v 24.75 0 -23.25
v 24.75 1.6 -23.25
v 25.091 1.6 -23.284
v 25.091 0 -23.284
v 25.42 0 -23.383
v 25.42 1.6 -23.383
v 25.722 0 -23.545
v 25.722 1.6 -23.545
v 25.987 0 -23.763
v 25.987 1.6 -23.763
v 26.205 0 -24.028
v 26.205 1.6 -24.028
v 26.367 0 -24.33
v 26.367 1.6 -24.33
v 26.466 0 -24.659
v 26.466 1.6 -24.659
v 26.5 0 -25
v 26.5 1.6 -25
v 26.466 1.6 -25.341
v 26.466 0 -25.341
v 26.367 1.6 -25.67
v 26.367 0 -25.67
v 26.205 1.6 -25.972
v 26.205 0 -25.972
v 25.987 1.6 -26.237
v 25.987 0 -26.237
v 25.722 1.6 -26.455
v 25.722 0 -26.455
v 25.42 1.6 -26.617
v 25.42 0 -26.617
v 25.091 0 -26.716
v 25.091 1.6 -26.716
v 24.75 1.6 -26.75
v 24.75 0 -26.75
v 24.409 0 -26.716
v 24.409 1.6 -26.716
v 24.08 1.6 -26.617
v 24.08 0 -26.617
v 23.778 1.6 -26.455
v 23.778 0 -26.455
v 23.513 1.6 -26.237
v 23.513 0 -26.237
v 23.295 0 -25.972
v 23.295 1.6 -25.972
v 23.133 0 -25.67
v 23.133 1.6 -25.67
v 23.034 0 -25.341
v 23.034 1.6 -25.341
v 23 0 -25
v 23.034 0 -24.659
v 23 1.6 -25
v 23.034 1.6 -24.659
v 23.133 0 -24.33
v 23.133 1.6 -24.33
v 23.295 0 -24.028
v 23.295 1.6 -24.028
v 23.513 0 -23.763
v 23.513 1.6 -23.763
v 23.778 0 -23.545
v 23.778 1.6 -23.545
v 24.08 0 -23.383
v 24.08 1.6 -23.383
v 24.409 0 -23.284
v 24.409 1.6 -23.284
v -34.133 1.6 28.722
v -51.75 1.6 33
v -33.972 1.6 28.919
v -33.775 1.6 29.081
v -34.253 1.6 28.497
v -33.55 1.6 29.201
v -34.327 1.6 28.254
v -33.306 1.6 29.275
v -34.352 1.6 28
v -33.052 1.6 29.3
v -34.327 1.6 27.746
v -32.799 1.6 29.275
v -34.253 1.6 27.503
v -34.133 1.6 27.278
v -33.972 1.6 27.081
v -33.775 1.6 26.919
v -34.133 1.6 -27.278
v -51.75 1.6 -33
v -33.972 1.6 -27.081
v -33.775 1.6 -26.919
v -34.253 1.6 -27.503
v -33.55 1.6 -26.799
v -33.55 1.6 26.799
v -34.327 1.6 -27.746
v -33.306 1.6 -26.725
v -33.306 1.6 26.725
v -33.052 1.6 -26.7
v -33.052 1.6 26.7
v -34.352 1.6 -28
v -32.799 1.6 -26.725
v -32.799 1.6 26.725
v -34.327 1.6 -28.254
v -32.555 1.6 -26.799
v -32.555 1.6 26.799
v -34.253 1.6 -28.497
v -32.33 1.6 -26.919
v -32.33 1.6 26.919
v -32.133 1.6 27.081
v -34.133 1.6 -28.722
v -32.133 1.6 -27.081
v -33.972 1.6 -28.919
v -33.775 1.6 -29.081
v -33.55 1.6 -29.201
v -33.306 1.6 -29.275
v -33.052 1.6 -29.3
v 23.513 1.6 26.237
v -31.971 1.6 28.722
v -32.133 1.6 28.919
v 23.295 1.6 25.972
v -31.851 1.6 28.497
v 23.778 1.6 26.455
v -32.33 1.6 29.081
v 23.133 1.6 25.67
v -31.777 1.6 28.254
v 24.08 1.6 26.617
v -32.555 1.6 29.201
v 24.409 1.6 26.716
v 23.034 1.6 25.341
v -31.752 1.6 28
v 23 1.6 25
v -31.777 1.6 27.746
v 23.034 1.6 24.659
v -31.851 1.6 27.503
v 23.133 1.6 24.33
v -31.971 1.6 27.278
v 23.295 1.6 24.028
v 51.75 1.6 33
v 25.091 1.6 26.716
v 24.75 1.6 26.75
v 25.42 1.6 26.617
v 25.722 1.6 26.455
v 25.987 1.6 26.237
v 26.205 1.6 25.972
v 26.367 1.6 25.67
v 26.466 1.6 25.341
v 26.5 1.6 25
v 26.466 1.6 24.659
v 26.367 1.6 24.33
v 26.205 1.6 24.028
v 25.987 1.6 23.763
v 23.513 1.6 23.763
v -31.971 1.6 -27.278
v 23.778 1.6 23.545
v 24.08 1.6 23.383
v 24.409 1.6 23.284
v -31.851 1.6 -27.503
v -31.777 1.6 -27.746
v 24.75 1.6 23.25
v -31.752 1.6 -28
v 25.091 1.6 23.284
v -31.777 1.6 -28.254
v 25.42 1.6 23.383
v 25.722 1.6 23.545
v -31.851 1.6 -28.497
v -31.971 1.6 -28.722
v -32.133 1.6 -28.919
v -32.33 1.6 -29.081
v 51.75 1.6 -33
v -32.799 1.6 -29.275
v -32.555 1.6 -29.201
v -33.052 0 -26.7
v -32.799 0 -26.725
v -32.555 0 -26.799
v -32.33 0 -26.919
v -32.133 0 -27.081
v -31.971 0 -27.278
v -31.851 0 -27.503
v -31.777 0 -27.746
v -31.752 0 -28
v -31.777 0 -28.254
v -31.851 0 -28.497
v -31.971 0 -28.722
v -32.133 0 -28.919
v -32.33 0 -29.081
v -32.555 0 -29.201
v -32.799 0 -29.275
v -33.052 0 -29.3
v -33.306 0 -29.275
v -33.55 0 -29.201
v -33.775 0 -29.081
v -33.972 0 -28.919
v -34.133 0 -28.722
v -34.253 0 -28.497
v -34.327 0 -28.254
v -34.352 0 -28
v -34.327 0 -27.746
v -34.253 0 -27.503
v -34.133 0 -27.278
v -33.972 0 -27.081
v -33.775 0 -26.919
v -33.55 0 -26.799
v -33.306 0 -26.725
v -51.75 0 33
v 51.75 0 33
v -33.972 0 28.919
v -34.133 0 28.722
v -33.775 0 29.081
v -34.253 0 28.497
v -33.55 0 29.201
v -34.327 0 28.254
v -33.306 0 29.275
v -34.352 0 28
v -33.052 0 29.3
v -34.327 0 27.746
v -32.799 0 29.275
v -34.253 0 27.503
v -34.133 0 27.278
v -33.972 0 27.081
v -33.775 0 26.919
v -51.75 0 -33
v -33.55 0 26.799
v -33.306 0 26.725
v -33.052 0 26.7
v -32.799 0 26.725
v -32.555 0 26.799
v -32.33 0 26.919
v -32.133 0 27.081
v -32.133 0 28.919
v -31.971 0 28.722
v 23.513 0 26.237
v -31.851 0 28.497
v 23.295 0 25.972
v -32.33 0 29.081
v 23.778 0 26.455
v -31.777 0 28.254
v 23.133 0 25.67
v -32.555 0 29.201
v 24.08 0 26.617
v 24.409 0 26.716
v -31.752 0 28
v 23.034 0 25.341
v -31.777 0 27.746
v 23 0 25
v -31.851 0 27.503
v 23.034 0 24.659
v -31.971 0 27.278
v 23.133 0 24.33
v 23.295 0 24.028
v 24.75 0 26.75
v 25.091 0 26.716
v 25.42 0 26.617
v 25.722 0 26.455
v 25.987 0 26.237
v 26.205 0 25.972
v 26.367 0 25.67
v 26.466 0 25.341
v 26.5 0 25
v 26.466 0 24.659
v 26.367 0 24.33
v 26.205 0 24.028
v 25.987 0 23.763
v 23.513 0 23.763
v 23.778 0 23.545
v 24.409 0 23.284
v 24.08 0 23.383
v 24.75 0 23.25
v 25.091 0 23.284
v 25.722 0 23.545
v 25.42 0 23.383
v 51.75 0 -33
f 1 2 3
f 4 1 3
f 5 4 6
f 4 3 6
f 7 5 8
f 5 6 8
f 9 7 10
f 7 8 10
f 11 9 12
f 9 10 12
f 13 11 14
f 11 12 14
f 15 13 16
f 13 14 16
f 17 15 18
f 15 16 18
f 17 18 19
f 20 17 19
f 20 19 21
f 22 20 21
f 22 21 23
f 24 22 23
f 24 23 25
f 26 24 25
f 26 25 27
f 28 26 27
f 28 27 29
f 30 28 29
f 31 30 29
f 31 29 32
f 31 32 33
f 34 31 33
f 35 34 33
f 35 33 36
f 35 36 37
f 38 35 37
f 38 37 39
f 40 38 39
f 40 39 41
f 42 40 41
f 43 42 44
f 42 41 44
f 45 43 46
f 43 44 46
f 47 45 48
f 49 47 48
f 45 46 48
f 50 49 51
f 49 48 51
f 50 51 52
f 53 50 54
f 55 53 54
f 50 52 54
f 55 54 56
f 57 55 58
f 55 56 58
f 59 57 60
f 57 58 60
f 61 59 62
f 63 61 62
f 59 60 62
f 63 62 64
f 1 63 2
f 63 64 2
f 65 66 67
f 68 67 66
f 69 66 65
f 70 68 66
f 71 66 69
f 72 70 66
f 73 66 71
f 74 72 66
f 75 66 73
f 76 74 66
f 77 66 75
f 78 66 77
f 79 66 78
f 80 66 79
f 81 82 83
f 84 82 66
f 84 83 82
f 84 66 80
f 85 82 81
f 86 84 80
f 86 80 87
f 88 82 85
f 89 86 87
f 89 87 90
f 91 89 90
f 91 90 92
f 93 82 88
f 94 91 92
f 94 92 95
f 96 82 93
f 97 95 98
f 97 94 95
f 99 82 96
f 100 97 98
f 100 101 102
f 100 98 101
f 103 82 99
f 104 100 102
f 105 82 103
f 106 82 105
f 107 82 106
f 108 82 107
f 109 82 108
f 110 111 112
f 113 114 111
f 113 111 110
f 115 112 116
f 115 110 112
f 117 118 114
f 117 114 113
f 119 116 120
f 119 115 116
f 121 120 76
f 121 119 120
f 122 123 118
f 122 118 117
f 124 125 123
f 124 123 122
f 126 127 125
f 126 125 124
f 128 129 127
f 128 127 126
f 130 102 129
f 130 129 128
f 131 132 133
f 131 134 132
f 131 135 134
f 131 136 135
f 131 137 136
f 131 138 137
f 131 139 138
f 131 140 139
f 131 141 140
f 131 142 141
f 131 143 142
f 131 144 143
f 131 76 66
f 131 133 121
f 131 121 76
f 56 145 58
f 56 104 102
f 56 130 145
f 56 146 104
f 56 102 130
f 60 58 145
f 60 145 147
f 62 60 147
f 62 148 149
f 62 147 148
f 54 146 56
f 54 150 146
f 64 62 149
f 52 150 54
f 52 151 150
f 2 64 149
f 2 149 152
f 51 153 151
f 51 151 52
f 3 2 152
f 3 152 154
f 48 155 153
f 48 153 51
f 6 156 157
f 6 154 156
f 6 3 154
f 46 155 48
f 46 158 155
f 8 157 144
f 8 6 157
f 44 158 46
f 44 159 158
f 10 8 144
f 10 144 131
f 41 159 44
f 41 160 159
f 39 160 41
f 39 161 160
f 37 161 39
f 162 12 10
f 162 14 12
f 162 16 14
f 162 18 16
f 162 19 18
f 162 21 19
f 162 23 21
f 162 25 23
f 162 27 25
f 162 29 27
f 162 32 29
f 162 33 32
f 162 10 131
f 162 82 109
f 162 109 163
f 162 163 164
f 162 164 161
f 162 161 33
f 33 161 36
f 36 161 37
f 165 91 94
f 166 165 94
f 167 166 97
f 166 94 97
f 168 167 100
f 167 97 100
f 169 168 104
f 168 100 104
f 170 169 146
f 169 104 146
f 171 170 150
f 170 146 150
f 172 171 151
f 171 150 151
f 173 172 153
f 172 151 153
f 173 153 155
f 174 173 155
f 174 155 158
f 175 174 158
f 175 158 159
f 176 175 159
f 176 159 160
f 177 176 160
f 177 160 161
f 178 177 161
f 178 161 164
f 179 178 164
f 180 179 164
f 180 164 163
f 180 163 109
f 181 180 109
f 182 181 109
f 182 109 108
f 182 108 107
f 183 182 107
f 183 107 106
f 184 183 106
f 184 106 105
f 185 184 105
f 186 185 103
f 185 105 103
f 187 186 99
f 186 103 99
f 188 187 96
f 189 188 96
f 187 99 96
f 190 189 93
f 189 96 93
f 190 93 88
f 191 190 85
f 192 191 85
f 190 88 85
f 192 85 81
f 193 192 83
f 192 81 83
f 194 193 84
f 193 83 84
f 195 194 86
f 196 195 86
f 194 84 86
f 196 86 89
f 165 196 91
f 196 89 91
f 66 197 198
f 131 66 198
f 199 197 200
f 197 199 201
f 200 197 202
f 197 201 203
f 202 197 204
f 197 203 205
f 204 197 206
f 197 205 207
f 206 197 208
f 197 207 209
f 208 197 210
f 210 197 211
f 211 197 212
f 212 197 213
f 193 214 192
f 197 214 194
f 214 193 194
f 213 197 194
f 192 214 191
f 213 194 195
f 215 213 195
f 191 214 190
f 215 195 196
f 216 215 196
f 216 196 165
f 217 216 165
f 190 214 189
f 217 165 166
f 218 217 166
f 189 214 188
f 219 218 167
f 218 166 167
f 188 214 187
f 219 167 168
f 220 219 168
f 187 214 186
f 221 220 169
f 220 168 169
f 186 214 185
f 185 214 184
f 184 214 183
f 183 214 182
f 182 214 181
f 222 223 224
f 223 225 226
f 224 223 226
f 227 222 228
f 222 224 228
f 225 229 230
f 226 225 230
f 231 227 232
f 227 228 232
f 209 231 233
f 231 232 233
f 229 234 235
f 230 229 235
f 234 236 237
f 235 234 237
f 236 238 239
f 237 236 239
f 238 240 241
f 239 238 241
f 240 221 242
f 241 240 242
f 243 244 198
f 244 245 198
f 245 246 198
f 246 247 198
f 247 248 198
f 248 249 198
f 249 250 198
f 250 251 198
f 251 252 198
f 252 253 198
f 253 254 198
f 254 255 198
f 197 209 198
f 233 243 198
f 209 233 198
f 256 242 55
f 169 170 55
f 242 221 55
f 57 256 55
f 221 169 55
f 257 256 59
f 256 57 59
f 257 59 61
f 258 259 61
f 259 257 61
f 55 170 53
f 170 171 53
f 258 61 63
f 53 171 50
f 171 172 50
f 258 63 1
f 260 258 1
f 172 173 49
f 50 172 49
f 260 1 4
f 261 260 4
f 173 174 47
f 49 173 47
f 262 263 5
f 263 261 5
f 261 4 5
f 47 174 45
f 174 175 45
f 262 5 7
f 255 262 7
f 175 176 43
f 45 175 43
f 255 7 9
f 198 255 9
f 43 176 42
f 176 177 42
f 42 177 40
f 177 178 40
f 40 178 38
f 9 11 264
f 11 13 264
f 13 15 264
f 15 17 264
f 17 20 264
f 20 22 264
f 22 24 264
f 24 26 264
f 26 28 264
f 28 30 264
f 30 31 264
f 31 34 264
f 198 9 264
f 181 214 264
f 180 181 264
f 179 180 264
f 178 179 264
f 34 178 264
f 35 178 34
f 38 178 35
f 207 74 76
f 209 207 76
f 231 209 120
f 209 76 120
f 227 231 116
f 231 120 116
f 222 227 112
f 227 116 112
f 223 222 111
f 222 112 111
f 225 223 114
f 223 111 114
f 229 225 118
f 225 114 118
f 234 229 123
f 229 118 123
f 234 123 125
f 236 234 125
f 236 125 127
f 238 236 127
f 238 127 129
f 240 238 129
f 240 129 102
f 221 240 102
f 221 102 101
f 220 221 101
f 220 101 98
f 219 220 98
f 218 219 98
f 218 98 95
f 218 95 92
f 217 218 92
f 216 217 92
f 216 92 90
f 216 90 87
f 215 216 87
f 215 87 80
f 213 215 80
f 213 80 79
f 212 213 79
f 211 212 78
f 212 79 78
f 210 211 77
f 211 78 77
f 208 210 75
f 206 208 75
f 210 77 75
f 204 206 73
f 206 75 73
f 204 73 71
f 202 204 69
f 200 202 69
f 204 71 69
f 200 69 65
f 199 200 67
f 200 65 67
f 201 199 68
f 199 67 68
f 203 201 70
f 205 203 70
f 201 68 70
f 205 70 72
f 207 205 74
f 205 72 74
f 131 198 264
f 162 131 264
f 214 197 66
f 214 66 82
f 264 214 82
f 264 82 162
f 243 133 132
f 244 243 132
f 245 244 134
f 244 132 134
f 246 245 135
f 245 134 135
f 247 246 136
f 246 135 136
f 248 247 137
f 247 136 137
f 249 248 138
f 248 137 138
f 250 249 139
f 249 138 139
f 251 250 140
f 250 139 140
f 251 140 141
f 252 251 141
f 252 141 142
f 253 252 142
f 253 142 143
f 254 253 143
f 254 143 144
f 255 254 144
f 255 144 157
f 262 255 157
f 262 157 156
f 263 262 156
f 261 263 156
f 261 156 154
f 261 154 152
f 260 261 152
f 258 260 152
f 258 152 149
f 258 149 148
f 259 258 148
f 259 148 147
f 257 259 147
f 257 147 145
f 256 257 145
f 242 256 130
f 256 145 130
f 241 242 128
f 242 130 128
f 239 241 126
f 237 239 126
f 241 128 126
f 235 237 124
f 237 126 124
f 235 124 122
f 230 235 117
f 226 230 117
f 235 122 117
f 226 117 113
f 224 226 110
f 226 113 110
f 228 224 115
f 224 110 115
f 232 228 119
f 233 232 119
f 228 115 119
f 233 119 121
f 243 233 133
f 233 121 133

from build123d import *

# Parameters (mm, degrees)
SKETCH1_W           = 103.5
SKETCH1_H           = 66
BOSS_EXTRUDE1_DEPTH = 1.6
SKETCH3_R           = 1.3
CUT_EXTRUDE2_DEPTH  = 10
CUT_EXTRUDE3_REACH  = 63.397
SKETCH4_R           = 1.75


with BuildPart() as part:
    # Sketch1 → Boss-Extrude1 (new body)
    with BuildSketch(Plane(origin=(0, 0, 0), x_dir=(1, 0, 0), z_dir=(0, 1, 0))):
        Rectangle(SKETCH1_W, SKETCH1_H)
    extrude(amount=BOSS_EXTRUDE1_DEPTH)

    # Sketch3 → Cut-Extrude2 (cut)
    with BuildSketch(Plane(origin=(0, 1.6, 0), x_dir=(1, 0, 0), z_dir=(0, 1, 0))):
        with Locations(Location((-33.052335, 28, 0), (0, 0, 270))):
            Circle(SKETCH3_R)
        with Locations(Location((-33.052335, -28, 0), (0, 0, 270))):
            Circle(SKETCH3_R)
    extrude(amount=-CUT_EXTRUDE2_DEPTH, mode=Mode.SUBTRACT)

    # Sketch4 → Cut-Extrude3 (cut, up to next)
    with BuildSketch(Plane(origin=(0, 1.6, 0), x_dir=(1, 0, 0), z_dir=(0, 1, 0)), mode=Mode.PRIVATE) as cut_extrude3_sk1:
        with Locations(Location((24.75, 25, 0), (0, 0, 270))):
            Circle(SKETCH4_R)
    cut_extrude3_tool1 = extrude(cut_extrude3_sk1.sketch, amount=-CUT_EXTRUDE3_REACH, mode=Mode.PRIVATE) & part.part
    # Sketch4 → Cut-Extrude3 (cut, up to next)
    with BuildSketch(Plane(origin=(0, 1.6, 0), x_dir=(1, 0, 0), z_dir=(0, 1, 0)), mode=Mode.PRIVATE) as cut_extrude3_sk2:
        with Locations(Location((24.75, -25, 0), (0, 0, 270))):
            Circle(SKETCH4_R)
    cut_extrude3_tool2 = extrude(cut_extrude3_sk2.sketch, amount=-CUT_EXTRUDE3_REACH, mode=Mode.PRIVATE) & part.part
    add(cut_extrude3_tool1.solids().sort_by_distance((24.75, 1.6, -25))[0], mode=Mode.SUBTRACT)
    add(cut_extrude3_tool2.solids().sort_by_distance((24.75, 1.6, 25))[0], mode=Mode.SUBTRACT)


solid = part.part
